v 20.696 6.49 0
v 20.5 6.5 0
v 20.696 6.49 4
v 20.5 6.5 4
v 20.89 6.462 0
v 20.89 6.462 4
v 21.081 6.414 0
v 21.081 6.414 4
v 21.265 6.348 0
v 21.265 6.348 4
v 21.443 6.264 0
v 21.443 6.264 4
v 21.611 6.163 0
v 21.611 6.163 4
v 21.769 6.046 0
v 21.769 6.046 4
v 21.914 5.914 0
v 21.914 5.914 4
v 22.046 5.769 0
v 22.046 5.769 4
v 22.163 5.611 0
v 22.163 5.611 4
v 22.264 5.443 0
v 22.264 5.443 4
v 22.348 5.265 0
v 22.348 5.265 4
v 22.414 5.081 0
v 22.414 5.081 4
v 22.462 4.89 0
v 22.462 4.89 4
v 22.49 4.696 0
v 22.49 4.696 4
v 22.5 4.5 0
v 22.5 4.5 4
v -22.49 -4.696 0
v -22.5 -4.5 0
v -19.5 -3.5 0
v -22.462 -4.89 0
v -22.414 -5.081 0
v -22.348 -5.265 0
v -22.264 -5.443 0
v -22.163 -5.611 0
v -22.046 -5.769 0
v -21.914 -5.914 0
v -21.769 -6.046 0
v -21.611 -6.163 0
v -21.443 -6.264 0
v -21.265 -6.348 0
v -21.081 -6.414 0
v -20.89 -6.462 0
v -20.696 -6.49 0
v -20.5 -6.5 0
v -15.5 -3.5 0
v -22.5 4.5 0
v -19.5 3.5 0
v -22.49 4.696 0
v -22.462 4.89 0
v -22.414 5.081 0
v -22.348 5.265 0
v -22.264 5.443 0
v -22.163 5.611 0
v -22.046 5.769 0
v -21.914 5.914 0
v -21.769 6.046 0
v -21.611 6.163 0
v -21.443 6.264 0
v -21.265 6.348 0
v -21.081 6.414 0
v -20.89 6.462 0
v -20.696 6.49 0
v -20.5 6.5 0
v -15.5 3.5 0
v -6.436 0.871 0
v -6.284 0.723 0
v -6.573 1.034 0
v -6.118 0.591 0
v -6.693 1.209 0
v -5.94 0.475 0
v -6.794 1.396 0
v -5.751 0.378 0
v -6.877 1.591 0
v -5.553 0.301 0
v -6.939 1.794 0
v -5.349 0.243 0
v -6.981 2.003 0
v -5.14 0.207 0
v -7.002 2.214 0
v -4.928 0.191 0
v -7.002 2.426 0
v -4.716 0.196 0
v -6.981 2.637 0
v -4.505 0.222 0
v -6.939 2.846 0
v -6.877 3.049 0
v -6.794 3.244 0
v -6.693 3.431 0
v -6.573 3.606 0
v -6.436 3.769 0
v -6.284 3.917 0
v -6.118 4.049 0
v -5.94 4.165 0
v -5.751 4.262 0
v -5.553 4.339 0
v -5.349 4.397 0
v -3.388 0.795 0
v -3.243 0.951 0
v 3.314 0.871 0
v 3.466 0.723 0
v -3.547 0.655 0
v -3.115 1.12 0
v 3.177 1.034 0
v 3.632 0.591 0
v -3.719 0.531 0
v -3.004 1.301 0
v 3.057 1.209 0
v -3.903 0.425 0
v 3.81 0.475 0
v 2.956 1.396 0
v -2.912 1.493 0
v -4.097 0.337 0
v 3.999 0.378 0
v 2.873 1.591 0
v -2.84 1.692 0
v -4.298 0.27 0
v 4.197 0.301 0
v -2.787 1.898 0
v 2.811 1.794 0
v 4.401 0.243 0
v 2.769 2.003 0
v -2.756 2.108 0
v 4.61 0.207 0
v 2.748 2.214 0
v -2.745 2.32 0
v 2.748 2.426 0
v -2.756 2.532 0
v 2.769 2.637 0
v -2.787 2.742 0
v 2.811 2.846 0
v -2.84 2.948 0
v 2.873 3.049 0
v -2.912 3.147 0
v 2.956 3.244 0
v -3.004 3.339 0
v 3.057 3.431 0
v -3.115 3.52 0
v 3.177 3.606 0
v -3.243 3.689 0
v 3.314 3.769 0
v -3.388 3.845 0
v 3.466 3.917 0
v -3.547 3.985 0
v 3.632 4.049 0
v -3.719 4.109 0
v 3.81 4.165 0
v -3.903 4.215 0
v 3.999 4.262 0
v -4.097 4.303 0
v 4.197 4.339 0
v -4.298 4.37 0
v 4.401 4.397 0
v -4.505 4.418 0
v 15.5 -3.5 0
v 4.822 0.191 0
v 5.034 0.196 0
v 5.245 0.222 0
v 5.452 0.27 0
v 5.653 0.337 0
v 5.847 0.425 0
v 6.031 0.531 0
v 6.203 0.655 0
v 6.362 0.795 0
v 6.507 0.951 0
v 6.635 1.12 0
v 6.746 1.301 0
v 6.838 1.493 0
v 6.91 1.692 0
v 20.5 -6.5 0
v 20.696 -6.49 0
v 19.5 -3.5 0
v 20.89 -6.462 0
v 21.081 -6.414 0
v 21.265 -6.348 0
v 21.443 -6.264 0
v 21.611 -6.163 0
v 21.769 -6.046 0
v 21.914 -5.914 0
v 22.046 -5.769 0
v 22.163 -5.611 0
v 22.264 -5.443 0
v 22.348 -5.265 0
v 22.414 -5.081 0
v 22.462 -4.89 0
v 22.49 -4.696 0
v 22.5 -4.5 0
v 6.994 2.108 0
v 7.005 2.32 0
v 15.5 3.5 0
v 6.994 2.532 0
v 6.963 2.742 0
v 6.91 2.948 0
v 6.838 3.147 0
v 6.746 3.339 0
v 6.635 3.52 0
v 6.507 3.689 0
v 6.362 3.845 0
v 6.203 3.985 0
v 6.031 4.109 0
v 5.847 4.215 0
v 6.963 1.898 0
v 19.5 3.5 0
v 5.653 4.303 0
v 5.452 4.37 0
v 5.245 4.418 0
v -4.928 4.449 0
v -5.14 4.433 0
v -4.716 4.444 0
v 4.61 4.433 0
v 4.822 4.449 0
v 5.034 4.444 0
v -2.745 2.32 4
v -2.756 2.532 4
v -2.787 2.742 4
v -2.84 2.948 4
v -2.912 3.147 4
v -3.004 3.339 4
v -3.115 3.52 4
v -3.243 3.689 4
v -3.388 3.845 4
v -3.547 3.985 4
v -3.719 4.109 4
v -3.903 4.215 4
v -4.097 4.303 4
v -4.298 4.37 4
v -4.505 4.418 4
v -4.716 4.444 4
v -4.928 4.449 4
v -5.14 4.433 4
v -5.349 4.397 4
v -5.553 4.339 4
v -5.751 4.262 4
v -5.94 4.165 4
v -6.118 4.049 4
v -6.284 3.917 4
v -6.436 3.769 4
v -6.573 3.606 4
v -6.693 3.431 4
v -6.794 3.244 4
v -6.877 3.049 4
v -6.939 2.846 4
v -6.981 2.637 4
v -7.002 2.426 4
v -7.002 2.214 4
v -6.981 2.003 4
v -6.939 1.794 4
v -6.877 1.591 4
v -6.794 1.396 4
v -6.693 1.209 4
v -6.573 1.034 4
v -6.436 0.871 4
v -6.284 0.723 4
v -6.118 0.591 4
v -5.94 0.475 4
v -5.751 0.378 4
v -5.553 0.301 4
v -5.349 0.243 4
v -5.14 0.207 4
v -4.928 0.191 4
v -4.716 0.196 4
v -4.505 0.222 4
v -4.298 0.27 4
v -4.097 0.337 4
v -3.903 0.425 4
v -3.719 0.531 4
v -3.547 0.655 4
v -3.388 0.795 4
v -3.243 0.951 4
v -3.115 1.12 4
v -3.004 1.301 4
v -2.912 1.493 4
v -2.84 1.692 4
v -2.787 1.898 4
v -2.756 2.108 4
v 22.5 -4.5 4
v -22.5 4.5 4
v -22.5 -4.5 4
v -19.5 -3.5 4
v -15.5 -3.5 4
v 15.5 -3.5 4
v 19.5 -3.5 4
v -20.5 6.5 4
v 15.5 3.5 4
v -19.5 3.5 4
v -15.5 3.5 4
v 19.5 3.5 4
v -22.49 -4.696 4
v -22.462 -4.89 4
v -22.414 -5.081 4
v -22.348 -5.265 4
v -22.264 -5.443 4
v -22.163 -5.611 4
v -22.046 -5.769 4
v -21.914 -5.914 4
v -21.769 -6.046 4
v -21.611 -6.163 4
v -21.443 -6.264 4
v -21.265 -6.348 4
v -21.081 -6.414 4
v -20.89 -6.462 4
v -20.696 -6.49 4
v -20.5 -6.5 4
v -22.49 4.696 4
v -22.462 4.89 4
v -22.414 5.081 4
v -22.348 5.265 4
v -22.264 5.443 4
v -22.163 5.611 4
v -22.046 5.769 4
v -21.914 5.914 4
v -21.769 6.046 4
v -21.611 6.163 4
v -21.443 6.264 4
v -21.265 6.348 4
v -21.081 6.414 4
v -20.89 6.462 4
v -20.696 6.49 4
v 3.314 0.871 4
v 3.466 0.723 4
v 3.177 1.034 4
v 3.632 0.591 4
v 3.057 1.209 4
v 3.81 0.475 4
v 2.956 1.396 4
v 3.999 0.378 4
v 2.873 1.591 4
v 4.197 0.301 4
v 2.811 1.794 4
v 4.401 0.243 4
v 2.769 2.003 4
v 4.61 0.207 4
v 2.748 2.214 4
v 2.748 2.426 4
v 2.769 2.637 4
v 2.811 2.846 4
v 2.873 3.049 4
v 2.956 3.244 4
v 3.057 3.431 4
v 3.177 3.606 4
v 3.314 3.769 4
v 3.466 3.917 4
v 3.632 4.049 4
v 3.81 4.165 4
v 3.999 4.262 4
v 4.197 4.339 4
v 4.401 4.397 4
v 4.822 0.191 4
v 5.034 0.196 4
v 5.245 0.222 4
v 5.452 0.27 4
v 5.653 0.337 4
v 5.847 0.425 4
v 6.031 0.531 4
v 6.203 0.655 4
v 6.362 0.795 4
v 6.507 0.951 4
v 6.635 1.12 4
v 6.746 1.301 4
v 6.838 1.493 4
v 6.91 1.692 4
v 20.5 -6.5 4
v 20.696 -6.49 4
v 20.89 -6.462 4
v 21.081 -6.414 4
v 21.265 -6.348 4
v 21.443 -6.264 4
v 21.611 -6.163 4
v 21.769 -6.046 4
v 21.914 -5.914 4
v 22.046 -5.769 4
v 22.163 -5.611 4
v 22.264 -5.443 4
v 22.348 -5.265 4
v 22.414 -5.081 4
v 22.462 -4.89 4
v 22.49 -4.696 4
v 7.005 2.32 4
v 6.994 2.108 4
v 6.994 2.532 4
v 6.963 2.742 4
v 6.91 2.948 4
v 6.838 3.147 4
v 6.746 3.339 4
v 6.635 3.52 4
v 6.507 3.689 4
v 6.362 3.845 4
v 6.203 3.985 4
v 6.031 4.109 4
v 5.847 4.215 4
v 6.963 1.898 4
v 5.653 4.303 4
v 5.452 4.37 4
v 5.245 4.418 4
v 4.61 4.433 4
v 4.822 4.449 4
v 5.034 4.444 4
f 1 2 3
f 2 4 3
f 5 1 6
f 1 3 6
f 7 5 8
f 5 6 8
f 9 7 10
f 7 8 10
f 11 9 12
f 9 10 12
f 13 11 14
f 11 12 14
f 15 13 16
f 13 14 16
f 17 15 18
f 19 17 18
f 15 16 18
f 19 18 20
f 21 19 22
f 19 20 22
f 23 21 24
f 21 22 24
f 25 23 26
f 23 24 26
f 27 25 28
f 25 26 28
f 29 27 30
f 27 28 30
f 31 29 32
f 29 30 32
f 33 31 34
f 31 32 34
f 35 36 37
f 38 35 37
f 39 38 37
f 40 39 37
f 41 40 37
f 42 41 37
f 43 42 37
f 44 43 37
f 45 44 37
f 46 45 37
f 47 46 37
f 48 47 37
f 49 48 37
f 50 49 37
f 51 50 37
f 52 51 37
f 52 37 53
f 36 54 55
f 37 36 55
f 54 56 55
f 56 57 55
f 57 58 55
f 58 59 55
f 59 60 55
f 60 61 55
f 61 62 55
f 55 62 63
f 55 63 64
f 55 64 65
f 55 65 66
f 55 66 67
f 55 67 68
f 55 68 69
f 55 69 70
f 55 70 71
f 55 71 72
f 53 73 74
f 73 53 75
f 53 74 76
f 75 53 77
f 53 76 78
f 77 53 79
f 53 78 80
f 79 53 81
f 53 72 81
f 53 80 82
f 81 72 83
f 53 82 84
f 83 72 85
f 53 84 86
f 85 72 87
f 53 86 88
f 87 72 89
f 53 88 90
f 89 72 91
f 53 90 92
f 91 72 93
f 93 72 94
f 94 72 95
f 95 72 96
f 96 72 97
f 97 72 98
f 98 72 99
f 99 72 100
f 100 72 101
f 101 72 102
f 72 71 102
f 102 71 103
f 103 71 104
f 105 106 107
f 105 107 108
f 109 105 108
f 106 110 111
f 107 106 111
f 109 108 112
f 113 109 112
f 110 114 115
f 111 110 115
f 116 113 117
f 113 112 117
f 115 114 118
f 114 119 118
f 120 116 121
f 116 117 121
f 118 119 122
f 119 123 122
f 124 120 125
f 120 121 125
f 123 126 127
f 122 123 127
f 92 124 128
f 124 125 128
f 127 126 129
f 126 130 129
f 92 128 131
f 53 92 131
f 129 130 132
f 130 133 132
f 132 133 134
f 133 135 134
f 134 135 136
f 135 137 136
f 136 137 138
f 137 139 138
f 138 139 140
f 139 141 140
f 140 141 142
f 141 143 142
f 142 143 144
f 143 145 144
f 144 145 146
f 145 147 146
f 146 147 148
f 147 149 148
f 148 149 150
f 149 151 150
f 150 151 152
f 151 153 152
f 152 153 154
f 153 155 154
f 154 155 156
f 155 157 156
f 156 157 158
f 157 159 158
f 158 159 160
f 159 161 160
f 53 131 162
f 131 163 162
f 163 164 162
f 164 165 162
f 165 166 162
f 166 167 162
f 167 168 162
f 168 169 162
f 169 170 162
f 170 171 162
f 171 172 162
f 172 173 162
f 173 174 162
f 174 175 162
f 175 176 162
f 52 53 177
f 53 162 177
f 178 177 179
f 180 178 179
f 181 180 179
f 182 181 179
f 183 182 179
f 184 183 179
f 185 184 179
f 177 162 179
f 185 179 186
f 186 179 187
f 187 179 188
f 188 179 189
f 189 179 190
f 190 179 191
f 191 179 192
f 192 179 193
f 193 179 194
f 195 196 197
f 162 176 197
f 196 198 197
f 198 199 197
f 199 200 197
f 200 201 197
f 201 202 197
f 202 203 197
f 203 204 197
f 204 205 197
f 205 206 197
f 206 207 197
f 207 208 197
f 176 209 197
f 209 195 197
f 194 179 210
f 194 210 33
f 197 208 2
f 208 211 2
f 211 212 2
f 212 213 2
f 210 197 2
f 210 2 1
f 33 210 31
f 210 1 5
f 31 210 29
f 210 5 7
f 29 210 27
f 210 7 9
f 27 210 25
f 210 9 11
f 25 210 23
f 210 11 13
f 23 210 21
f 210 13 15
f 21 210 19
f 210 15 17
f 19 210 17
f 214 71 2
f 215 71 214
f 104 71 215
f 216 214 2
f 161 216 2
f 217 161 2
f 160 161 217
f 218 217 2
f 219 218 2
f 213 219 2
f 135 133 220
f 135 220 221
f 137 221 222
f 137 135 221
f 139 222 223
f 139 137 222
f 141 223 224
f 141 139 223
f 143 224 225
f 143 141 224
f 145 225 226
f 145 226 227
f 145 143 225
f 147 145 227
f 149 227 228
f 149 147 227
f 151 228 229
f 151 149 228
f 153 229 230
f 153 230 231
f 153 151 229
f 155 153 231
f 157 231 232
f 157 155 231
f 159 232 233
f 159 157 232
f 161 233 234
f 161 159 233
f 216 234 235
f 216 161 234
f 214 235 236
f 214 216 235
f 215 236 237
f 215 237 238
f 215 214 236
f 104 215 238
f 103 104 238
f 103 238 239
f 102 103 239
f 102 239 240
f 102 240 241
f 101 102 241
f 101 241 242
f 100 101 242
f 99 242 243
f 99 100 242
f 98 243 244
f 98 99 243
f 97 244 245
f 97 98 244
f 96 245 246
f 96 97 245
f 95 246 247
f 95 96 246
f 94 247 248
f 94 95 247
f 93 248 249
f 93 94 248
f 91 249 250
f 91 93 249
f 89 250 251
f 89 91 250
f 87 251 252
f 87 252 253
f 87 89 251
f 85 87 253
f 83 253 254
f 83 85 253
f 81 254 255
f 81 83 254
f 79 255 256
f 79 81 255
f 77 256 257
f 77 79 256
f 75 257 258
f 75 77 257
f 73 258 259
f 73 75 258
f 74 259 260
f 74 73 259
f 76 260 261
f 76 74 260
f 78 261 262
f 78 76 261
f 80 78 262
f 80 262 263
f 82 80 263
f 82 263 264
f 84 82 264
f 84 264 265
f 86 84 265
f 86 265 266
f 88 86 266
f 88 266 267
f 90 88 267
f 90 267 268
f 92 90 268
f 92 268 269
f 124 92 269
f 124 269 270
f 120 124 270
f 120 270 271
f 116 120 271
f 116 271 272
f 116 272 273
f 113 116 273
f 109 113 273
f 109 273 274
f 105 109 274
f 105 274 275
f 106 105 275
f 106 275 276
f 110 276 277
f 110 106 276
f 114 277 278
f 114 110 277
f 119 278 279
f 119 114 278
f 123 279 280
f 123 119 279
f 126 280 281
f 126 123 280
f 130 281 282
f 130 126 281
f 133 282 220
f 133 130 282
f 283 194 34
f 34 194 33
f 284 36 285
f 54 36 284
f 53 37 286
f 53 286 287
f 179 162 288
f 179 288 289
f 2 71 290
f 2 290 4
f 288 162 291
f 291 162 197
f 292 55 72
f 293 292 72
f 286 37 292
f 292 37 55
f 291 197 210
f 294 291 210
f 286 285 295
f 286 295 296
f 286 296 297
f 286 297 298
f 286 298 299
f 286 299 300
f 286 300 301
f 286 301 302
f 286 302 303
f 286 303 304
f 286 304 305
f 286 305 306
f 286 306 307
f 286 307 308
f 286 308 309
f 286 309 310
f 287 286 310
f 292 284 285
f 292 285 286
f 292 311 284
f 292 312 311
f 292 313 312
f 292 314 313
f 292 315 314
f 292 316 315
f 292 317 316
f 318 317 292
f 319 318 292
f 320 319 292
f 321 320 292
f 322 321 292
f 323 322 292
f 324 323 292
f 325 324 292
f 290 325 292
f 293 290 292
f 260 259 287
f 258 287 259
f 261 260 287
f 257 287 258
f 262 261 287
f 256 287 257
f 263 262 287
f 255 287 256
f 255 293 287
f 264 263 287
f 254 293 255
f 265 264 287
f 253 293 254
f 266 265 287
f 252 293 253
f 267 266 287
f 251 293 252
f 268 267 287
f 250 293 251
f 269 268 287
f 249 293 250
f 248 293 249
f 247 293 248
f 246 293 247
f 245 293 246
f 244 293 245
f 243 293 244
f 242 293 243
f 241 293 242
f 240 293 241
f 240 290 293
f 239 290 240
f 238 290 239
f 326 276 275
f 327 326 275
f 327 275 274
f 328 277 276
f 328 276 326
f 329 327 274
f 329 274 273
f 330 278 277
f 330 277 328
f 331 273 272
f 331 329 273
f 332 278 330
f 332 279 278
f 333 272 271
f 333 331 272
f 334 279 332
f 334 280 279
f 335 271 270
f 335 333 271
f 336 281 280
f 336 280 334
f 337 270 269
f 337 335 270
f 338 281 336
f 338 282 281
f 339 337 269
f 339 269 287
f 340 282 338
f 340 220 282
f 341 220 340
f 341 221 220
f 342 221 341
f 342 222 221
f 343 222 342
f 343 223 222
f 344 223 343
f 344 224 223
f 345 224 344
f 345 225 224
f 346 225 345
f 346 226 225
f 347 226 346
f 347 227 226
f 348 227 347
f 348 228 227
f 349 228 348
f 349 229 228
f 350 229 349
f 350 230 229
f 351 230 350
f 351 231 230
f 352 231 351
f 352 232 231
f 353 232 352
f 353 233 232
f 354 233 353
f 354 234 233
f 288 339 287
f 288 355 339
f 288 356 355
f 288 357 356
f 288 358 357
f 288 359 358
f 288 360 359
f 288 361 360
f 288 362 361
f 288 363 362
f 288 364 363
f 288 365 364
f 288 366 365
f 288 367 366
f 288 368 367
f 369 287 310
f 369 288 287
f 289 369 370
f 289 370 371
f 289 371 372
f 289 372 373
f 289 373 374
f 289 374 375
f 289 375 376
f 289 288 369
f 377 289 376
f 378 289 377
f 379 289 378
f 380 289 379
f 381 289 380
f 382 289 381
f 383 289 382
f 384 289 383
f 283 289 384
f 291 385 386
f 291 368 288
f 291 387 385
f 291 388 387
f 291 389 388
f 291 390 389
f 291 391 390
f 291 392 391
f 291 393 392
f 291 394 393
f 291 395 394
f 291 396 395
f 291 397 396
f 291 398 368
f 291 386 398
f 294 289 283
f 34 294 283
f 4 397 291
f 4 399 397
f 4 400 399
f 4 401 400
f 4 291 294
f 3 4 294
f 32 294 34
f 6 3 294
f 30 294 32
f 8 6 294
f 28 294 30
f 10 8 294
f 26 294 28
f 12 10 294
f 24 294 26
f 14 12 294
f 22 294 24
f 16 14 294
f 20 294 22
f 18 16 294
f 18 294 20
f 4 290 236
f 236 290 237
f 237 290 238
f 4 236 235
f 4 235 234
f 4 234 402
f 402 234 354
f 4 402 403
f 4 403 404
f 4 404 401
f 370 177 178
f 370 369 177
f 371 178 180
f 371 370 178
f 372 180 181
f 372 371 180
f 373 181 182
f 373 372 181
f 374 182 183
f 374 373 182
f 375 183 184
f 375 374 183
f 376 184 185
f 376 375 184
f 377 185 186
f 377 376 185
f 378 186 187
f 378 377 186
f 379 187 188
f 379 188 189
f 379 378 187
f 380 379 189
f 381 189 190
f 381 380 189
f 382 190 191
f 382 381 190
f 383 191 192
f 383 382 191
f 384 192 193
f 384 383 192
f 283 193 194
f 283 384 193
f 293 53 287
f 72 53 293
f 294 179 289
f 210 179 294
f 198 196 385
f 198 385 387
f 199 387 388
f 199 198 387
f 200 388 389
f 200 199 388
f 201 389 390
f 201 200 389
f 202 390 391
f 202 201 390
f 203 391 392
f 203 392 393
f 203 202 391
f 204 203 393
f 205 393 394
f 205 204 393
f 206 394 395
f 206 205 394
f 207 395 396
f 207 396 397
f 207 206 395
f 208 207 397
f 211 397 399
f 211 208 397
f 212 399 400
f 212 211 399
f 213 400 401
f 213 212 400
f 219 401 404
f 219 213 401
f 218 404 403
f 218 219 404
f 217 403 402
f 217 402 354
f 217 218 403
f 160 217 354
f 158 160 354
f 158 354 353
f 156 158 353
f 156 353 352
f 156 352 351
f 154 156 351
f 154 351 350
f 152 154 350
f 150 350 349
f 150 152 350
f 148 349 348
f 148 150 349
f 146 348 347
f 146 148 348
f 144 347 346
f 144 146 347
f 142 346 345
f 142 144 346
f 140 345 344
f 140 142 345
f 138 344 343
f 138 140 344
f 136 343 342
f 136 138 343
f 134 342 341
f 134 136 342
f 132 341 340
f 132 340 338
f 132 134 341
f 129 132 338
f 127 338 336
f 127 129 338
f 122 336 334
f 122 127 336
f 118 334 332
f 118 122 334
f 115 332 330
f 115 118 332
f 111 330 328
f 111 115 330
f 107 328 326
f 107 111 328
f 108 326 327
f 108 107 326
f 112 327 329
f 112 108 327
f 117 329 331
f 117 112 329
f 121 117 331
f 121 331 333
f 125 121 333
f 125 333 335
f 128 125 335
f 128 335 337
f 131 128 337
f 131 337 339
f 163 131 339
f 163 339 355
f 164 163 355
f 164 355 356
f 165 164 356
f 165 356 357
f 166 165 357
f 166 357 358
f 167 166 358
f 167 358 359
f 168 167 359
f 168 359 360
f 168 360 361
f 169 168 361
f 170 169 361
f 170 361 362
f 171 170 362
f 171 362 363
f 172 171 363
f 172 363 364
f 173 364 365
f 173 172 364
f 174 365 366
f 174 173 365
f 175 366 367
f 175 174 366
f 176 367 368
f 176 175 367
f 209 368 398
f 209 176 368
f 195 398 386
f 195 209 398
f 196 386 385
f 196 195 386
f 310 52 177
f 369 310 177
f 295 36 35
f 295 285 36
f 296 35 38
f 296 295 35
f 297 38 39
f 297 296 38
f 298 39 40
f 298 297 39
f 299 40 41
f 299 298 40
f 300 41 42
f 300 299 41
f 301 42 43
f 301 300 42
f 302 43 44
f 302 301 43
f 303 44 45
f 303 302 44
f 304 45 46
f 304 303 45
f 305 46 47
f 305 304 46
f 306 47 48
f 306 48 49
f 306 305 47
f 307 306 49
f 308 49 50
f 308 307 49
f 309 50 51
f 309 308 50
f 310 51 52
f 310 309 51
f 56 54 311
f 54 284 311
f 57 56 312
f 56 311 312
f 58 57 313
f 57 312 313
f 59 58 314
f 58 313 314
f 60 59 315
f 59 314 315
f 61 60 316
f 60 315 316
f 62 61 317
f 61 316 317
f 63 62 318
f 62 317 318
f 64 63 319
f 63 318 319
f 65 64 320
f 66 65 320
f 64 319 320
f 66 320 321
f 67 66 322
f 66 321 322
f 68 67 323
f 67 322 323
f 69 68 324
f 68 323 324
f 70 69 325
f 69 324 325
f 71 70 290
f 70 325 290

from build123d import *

# Parameters (mm, degrees)
ESQUISSE1_W        = 45
ESQUISSE1_H        = 13
ESQUISSE1_R        = 2.13
ESQUISSE1_W_2      = 4
ESQUISSE1_H_2      = 7
BOSS_EXTRU_1_DEPTH = 4
CONG_1_R           = 2


with BuildPart() as part:
    # Esquisse1 → Boss.-Extru.1 (new body)
    with BuildSketch(Plane.XY):
        Rectangle(ESQUISSE1_W, ESQUISSE1_H)
        with Locations((-4.875, 2.32)):
            Circle(ESQUISSE1_R, mode=Mode.SUBTRACT)
        with Locations((4.875, 2.32)):
            Circle(ESQUISSE1_R, mode=Mode.SUBTRACT)
        with Locations((-17.5, 0)):
            Rectangle(ESQUISSE1_W_2, ESQUISSE1_H_2, mode=Mode.SUBTRACT)
        with Locations((17.5, 0)):
            Rectangle(ESQUISSE1_W_2, ESQUISSE1_H_2, mode=Mode.SUBTRACT)
    extrude(amount=BOSS_EXTRU_1_DEPTH)

    # Congé1
    cong_1_edges = [part.edges().sort_by_distance(p)[0] for p in [
        (-22.5, 6.5, 2),
        (22.5, 6.5, 2),
        (22.5, -6.5, 2),
        (-22.5, -6.5, 2),
    ]]
    fillet(cong_1_edges, radius=CONG_1_R)


solid = part.part
